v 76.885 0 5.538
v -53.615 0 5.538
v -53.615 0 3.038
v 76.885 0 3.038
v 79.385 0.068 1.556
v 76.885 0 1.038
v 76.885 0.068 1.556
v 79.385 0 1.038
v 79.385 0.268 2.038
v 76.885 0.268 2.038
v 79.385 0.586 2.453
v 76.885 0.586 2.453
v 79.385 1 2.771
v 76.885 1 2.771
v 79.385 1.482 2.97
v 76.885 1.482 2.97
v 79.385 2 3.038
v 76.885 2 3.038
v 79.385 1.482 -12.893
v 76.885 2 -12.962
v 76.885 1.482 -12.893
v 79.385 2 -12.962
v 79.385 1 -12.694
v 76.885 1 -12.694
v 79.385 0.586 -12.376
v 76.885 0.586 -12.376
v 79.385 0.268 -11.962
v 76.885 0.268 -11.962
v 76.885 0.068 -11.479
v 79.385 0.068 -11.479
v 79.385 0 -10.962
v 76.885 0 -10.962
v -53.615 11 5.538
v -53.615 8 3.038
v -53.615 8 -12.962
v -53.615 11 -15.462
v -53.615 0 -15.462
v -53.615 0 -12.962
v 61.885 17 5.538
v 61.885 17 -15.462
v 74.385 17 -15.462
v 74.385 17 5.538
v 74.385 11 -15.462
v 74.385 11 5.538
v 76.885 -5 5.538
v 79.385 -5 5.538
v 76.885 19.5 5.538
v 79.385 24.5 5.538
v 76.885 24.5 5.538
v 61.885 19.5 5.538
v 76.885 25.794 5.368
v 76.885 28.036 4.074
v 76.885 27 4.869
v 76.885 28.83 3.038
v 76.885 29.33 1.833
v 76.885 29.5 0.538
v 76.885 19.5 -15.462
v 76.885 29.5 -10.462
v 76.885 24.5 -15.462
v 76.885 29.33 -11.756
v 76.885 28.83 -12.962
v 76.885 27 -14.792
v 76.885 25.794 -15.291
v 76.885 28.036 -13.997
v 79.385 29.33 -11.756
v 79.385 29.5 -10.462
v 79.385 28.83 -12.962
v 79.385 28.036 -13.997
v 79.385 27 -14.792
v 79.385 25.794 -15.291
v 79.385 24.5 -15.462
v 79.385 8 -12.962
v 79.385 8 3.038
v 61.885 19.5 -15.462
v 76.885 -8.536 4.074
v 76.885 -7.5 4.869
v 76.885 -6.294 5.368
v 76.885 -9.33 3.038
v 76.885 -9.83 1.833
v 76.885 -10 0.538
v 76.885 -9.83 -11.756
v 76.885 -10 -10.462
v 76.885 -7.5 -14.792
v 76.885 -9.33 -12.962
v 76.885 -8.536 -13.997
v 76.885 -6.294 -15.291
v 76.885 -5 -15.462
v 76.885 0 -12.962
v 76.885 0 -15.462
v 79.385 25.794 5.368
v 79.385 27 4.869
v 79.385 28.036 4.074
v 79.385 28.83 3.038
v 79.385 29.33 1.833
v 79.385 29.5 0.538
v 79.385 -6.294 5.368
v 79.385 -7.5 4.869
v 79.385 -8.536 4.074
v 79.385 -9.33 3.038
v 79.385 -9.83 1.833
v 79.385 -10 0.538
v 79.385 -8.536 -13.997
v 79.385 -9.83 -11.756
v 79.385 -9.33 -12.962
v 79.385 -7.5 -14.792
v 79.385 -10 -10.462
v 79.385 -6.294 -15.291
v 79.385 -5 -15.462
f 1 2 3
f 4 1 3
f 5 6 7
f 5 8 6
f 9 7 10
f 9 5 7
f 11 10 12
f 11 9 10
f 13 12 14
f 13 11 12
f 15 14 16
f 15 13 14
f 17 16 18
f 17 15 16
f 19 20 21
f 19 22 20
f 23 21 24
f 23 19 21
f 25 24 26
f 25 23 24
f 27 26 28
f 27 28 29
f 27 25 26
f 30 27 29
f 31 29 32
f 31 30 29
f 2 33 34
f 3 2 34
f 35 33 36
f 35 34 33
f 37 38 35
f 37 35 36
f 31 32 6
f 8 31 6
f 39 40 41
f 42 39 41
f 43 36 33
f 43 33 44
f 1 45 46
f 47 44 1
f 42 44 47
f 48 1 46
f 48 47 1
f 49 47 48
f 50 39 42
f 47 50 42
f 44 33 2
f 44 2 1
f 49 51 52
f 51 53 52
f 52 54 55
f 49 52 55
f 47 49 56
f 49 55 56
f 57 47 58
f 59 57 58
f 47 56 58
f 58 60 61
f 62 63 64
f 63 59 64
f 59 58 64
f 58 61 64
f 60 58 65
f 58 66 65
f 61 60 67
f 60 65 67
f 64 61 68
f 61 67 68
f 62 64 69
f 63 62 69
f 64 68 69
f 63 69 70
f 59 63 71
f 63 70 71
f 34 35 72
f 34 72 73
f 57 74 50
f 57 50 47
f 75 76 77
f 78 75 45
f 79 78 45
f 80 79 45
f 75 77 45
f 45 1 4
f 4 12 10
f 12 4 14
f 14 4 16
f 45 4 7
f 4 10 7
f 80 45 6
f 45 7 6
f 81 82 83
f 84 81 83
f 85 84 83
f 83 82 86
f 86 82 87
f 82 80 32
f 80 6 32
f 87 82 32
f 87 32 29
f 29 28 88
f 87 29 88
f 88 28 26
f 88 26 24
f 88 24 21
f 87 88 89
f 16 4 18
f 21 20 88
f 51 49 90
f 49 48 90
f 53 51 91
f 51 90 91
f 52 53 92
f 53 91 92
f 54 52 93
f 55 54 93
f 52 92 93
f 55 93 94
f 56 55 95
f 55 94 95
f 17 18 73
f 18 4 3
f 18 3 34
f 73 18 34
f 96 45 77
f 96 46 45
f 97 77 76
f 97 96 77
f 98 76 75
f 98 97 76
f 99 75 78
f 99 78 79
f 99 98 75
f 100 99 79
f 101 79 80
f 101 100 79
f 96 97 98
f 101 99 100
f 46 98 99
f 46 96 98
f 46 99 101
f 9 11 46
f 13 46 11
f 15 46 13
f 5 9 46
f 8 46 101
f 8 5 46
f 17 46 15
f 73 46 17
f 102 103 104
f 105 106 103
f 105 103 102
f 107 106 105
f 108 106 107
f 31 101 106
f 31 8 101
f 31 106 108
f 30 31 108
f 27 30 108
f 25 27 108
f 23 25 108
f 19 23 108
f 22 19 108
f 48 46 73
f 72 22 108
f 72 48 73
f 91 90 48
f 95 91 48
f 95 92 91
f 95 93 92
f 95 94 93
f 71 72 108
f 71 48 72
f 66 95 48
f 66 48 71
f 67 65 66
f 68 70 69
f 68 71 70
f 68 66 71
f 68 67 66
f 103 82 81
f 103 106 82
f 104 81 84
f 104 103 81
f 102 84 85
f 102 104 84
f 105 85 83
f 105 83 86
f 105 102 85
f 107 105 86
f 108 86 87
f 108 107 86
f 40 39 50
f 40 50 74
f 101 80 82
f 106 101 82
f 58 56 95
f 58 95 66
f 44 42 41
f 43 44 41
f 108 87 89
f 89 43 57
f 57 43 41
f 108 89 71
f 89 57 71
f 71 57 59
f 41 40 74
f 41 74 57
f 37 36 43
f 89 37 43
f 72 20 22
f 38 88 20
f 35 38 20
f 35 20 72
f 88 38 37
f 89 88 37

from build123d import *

# Parameters (mm, degrees)
SKETCH1_W             = 128
SKETCH1_H             = 2.5
BOSS_EXTRUDE1_DEPTH   = 8
BOSS_EXTRUDE1_2_DEPTH = 8
SKETCH2_W             = 128
SKETCH2_H             = 21
BOSS_EXTRUDE2_DEPTH   = 3
SKETCH3_W             = 21
SKETCH3_H             = 17
BOSS_EXTRUDE3_DEPTH   = 2.5
SKETCH4_W             = 15
SKETCH4_H             = 21
BOSS_EXTRUDE4_DEPTH   = 2.5
SKETCH5_W             = 21
SKETCH5_H             = 39.5
BOSS_EXTRUDE5_DEPTH   = 2.5
FILLET1_R             = 5
SKETCH6_W             = 16
SKETCH6_H             = 8
CUT_EXTRUDE1_DEPTH    = 18.5
FILLET2_R             = 2


with BuildPart() as part:
    # Sketch1 → Boss-Extrude1 (new body)
    with BuildSketch(Plane(origin=(0, 0, 0), x_dir=(1, 0, 0), z_dir=(0, 1, 0))):
        with Locations((10.384615385, 14.211538462)):
            Rectangle(SKETCH1_W, SKETCH1_H)
    extrude(amount=BOSS_EXTRUDE1_DEPTH)



with BuildPart() as body_2:
    # Sketch1 → Boss-Extrude1 2 (new body)
    with BuildSketch(Plane(origin=(0, 0, 0), x_dir=(1, 0, 0), z_dir=(0, 1, 0))):
        with Locations((10.384615385, -4.288461538)):
            Rectangle(SKETCH1_W, SKETCH1_H)
    extrude(amount=BOSS_EXTRUDE1_2_DEPTH)


with BuildPart() as part_1:
    add(part.part)

    add(body_2.part)  # Boss-Extrude2 merges body 2
    # Sketch2 → Boss-Extrude2 (add)
    with BuildSketch(Plane(origin=(0, 8, 0), x_dir=(1, 0, 0), z_dir=(0, 1, 0))):
        with Locations((10.384615385, 4.961538462)):
            Rectangle(SKETCH2_W, SKETCH2_H)
    extrude(amount=BOSS_EXTRUDE2_DEPTH)

    # Sketch3 → Boss-Extrude3 (add)
    with BuildSketch(Plane(origin=(74.384615385, 0, 0), x_dir=(0, 0, -1), z_dir=(1, 0, 0))):
        with Locations((4.961538462, 8.5)):
            Rectangle(SKETCH3_W, SKETCH3_H)
    extrude(amount=BOSS_EXTRUDE3_DEPTH)

    # Sketch4 → Boss-Extrude4 (add)
    with BuildSketch(Plane(origin=(0, 17, 0), x_dir=(1, 0, 0), z_dir=(0, 1, 0))):
        with Locations((69.384615385, 4.961538462)):
            Rectangle(SKETCH4_W, SKETCH4_H)
    extrude(amount=BOSS_EXTRUDE4_DEPTH)

    # Sketch5 → Boss-Extrude5 (add)
    with BuildSketch(Plane(origin=(76.884615385, 0, 0), x_dir=(0, 0, -1), z_dir=(1, 0, 0))):
        with Locations((4.961538462, 9.75)):
            Rectangle(SKETCH5_W, SKETCH5_H)
    extrude(amount=BOSS_EXTRUDE5_DEPTH)

    # Fillet1
    fillet1_edges = [part_1.edges().sort_by_distance(p)[0] for p in [
        (78.134615385, 29.5, 5.538461538),
        (78.134615385, -10, 5.538461538),
        (78.134615385, -10, -15.461538462),
        (78.134615385, 29.5, -15.461538462),
    ]]
    fillet(fillet1_edges, radius=FILLET1_R)

    # Sketch6 → Cut-Extrude1 (cut)
    with BuildSketch(Plane.ZY.offset(-74.384615385)):
        with Locations((-4.961538462, 4)):
            Rectangle(SKETCH6_W, SKETCH6_H)
    extrude(amount=-CUT_EXTRUDE1_DEPTH, mode=Mode.SUBTRACT)

    # Fillet2
    fillet2_edges = [part_1.edges().sort_by_distance(p)[0] for p in [
        (78.134615385, 0, 3.038461538),
        (78.134615385, 0, -12.961538462),
    ]]
    fillet(fillet2_edges, radius=FILLET2_R)


solid = part_1.part
